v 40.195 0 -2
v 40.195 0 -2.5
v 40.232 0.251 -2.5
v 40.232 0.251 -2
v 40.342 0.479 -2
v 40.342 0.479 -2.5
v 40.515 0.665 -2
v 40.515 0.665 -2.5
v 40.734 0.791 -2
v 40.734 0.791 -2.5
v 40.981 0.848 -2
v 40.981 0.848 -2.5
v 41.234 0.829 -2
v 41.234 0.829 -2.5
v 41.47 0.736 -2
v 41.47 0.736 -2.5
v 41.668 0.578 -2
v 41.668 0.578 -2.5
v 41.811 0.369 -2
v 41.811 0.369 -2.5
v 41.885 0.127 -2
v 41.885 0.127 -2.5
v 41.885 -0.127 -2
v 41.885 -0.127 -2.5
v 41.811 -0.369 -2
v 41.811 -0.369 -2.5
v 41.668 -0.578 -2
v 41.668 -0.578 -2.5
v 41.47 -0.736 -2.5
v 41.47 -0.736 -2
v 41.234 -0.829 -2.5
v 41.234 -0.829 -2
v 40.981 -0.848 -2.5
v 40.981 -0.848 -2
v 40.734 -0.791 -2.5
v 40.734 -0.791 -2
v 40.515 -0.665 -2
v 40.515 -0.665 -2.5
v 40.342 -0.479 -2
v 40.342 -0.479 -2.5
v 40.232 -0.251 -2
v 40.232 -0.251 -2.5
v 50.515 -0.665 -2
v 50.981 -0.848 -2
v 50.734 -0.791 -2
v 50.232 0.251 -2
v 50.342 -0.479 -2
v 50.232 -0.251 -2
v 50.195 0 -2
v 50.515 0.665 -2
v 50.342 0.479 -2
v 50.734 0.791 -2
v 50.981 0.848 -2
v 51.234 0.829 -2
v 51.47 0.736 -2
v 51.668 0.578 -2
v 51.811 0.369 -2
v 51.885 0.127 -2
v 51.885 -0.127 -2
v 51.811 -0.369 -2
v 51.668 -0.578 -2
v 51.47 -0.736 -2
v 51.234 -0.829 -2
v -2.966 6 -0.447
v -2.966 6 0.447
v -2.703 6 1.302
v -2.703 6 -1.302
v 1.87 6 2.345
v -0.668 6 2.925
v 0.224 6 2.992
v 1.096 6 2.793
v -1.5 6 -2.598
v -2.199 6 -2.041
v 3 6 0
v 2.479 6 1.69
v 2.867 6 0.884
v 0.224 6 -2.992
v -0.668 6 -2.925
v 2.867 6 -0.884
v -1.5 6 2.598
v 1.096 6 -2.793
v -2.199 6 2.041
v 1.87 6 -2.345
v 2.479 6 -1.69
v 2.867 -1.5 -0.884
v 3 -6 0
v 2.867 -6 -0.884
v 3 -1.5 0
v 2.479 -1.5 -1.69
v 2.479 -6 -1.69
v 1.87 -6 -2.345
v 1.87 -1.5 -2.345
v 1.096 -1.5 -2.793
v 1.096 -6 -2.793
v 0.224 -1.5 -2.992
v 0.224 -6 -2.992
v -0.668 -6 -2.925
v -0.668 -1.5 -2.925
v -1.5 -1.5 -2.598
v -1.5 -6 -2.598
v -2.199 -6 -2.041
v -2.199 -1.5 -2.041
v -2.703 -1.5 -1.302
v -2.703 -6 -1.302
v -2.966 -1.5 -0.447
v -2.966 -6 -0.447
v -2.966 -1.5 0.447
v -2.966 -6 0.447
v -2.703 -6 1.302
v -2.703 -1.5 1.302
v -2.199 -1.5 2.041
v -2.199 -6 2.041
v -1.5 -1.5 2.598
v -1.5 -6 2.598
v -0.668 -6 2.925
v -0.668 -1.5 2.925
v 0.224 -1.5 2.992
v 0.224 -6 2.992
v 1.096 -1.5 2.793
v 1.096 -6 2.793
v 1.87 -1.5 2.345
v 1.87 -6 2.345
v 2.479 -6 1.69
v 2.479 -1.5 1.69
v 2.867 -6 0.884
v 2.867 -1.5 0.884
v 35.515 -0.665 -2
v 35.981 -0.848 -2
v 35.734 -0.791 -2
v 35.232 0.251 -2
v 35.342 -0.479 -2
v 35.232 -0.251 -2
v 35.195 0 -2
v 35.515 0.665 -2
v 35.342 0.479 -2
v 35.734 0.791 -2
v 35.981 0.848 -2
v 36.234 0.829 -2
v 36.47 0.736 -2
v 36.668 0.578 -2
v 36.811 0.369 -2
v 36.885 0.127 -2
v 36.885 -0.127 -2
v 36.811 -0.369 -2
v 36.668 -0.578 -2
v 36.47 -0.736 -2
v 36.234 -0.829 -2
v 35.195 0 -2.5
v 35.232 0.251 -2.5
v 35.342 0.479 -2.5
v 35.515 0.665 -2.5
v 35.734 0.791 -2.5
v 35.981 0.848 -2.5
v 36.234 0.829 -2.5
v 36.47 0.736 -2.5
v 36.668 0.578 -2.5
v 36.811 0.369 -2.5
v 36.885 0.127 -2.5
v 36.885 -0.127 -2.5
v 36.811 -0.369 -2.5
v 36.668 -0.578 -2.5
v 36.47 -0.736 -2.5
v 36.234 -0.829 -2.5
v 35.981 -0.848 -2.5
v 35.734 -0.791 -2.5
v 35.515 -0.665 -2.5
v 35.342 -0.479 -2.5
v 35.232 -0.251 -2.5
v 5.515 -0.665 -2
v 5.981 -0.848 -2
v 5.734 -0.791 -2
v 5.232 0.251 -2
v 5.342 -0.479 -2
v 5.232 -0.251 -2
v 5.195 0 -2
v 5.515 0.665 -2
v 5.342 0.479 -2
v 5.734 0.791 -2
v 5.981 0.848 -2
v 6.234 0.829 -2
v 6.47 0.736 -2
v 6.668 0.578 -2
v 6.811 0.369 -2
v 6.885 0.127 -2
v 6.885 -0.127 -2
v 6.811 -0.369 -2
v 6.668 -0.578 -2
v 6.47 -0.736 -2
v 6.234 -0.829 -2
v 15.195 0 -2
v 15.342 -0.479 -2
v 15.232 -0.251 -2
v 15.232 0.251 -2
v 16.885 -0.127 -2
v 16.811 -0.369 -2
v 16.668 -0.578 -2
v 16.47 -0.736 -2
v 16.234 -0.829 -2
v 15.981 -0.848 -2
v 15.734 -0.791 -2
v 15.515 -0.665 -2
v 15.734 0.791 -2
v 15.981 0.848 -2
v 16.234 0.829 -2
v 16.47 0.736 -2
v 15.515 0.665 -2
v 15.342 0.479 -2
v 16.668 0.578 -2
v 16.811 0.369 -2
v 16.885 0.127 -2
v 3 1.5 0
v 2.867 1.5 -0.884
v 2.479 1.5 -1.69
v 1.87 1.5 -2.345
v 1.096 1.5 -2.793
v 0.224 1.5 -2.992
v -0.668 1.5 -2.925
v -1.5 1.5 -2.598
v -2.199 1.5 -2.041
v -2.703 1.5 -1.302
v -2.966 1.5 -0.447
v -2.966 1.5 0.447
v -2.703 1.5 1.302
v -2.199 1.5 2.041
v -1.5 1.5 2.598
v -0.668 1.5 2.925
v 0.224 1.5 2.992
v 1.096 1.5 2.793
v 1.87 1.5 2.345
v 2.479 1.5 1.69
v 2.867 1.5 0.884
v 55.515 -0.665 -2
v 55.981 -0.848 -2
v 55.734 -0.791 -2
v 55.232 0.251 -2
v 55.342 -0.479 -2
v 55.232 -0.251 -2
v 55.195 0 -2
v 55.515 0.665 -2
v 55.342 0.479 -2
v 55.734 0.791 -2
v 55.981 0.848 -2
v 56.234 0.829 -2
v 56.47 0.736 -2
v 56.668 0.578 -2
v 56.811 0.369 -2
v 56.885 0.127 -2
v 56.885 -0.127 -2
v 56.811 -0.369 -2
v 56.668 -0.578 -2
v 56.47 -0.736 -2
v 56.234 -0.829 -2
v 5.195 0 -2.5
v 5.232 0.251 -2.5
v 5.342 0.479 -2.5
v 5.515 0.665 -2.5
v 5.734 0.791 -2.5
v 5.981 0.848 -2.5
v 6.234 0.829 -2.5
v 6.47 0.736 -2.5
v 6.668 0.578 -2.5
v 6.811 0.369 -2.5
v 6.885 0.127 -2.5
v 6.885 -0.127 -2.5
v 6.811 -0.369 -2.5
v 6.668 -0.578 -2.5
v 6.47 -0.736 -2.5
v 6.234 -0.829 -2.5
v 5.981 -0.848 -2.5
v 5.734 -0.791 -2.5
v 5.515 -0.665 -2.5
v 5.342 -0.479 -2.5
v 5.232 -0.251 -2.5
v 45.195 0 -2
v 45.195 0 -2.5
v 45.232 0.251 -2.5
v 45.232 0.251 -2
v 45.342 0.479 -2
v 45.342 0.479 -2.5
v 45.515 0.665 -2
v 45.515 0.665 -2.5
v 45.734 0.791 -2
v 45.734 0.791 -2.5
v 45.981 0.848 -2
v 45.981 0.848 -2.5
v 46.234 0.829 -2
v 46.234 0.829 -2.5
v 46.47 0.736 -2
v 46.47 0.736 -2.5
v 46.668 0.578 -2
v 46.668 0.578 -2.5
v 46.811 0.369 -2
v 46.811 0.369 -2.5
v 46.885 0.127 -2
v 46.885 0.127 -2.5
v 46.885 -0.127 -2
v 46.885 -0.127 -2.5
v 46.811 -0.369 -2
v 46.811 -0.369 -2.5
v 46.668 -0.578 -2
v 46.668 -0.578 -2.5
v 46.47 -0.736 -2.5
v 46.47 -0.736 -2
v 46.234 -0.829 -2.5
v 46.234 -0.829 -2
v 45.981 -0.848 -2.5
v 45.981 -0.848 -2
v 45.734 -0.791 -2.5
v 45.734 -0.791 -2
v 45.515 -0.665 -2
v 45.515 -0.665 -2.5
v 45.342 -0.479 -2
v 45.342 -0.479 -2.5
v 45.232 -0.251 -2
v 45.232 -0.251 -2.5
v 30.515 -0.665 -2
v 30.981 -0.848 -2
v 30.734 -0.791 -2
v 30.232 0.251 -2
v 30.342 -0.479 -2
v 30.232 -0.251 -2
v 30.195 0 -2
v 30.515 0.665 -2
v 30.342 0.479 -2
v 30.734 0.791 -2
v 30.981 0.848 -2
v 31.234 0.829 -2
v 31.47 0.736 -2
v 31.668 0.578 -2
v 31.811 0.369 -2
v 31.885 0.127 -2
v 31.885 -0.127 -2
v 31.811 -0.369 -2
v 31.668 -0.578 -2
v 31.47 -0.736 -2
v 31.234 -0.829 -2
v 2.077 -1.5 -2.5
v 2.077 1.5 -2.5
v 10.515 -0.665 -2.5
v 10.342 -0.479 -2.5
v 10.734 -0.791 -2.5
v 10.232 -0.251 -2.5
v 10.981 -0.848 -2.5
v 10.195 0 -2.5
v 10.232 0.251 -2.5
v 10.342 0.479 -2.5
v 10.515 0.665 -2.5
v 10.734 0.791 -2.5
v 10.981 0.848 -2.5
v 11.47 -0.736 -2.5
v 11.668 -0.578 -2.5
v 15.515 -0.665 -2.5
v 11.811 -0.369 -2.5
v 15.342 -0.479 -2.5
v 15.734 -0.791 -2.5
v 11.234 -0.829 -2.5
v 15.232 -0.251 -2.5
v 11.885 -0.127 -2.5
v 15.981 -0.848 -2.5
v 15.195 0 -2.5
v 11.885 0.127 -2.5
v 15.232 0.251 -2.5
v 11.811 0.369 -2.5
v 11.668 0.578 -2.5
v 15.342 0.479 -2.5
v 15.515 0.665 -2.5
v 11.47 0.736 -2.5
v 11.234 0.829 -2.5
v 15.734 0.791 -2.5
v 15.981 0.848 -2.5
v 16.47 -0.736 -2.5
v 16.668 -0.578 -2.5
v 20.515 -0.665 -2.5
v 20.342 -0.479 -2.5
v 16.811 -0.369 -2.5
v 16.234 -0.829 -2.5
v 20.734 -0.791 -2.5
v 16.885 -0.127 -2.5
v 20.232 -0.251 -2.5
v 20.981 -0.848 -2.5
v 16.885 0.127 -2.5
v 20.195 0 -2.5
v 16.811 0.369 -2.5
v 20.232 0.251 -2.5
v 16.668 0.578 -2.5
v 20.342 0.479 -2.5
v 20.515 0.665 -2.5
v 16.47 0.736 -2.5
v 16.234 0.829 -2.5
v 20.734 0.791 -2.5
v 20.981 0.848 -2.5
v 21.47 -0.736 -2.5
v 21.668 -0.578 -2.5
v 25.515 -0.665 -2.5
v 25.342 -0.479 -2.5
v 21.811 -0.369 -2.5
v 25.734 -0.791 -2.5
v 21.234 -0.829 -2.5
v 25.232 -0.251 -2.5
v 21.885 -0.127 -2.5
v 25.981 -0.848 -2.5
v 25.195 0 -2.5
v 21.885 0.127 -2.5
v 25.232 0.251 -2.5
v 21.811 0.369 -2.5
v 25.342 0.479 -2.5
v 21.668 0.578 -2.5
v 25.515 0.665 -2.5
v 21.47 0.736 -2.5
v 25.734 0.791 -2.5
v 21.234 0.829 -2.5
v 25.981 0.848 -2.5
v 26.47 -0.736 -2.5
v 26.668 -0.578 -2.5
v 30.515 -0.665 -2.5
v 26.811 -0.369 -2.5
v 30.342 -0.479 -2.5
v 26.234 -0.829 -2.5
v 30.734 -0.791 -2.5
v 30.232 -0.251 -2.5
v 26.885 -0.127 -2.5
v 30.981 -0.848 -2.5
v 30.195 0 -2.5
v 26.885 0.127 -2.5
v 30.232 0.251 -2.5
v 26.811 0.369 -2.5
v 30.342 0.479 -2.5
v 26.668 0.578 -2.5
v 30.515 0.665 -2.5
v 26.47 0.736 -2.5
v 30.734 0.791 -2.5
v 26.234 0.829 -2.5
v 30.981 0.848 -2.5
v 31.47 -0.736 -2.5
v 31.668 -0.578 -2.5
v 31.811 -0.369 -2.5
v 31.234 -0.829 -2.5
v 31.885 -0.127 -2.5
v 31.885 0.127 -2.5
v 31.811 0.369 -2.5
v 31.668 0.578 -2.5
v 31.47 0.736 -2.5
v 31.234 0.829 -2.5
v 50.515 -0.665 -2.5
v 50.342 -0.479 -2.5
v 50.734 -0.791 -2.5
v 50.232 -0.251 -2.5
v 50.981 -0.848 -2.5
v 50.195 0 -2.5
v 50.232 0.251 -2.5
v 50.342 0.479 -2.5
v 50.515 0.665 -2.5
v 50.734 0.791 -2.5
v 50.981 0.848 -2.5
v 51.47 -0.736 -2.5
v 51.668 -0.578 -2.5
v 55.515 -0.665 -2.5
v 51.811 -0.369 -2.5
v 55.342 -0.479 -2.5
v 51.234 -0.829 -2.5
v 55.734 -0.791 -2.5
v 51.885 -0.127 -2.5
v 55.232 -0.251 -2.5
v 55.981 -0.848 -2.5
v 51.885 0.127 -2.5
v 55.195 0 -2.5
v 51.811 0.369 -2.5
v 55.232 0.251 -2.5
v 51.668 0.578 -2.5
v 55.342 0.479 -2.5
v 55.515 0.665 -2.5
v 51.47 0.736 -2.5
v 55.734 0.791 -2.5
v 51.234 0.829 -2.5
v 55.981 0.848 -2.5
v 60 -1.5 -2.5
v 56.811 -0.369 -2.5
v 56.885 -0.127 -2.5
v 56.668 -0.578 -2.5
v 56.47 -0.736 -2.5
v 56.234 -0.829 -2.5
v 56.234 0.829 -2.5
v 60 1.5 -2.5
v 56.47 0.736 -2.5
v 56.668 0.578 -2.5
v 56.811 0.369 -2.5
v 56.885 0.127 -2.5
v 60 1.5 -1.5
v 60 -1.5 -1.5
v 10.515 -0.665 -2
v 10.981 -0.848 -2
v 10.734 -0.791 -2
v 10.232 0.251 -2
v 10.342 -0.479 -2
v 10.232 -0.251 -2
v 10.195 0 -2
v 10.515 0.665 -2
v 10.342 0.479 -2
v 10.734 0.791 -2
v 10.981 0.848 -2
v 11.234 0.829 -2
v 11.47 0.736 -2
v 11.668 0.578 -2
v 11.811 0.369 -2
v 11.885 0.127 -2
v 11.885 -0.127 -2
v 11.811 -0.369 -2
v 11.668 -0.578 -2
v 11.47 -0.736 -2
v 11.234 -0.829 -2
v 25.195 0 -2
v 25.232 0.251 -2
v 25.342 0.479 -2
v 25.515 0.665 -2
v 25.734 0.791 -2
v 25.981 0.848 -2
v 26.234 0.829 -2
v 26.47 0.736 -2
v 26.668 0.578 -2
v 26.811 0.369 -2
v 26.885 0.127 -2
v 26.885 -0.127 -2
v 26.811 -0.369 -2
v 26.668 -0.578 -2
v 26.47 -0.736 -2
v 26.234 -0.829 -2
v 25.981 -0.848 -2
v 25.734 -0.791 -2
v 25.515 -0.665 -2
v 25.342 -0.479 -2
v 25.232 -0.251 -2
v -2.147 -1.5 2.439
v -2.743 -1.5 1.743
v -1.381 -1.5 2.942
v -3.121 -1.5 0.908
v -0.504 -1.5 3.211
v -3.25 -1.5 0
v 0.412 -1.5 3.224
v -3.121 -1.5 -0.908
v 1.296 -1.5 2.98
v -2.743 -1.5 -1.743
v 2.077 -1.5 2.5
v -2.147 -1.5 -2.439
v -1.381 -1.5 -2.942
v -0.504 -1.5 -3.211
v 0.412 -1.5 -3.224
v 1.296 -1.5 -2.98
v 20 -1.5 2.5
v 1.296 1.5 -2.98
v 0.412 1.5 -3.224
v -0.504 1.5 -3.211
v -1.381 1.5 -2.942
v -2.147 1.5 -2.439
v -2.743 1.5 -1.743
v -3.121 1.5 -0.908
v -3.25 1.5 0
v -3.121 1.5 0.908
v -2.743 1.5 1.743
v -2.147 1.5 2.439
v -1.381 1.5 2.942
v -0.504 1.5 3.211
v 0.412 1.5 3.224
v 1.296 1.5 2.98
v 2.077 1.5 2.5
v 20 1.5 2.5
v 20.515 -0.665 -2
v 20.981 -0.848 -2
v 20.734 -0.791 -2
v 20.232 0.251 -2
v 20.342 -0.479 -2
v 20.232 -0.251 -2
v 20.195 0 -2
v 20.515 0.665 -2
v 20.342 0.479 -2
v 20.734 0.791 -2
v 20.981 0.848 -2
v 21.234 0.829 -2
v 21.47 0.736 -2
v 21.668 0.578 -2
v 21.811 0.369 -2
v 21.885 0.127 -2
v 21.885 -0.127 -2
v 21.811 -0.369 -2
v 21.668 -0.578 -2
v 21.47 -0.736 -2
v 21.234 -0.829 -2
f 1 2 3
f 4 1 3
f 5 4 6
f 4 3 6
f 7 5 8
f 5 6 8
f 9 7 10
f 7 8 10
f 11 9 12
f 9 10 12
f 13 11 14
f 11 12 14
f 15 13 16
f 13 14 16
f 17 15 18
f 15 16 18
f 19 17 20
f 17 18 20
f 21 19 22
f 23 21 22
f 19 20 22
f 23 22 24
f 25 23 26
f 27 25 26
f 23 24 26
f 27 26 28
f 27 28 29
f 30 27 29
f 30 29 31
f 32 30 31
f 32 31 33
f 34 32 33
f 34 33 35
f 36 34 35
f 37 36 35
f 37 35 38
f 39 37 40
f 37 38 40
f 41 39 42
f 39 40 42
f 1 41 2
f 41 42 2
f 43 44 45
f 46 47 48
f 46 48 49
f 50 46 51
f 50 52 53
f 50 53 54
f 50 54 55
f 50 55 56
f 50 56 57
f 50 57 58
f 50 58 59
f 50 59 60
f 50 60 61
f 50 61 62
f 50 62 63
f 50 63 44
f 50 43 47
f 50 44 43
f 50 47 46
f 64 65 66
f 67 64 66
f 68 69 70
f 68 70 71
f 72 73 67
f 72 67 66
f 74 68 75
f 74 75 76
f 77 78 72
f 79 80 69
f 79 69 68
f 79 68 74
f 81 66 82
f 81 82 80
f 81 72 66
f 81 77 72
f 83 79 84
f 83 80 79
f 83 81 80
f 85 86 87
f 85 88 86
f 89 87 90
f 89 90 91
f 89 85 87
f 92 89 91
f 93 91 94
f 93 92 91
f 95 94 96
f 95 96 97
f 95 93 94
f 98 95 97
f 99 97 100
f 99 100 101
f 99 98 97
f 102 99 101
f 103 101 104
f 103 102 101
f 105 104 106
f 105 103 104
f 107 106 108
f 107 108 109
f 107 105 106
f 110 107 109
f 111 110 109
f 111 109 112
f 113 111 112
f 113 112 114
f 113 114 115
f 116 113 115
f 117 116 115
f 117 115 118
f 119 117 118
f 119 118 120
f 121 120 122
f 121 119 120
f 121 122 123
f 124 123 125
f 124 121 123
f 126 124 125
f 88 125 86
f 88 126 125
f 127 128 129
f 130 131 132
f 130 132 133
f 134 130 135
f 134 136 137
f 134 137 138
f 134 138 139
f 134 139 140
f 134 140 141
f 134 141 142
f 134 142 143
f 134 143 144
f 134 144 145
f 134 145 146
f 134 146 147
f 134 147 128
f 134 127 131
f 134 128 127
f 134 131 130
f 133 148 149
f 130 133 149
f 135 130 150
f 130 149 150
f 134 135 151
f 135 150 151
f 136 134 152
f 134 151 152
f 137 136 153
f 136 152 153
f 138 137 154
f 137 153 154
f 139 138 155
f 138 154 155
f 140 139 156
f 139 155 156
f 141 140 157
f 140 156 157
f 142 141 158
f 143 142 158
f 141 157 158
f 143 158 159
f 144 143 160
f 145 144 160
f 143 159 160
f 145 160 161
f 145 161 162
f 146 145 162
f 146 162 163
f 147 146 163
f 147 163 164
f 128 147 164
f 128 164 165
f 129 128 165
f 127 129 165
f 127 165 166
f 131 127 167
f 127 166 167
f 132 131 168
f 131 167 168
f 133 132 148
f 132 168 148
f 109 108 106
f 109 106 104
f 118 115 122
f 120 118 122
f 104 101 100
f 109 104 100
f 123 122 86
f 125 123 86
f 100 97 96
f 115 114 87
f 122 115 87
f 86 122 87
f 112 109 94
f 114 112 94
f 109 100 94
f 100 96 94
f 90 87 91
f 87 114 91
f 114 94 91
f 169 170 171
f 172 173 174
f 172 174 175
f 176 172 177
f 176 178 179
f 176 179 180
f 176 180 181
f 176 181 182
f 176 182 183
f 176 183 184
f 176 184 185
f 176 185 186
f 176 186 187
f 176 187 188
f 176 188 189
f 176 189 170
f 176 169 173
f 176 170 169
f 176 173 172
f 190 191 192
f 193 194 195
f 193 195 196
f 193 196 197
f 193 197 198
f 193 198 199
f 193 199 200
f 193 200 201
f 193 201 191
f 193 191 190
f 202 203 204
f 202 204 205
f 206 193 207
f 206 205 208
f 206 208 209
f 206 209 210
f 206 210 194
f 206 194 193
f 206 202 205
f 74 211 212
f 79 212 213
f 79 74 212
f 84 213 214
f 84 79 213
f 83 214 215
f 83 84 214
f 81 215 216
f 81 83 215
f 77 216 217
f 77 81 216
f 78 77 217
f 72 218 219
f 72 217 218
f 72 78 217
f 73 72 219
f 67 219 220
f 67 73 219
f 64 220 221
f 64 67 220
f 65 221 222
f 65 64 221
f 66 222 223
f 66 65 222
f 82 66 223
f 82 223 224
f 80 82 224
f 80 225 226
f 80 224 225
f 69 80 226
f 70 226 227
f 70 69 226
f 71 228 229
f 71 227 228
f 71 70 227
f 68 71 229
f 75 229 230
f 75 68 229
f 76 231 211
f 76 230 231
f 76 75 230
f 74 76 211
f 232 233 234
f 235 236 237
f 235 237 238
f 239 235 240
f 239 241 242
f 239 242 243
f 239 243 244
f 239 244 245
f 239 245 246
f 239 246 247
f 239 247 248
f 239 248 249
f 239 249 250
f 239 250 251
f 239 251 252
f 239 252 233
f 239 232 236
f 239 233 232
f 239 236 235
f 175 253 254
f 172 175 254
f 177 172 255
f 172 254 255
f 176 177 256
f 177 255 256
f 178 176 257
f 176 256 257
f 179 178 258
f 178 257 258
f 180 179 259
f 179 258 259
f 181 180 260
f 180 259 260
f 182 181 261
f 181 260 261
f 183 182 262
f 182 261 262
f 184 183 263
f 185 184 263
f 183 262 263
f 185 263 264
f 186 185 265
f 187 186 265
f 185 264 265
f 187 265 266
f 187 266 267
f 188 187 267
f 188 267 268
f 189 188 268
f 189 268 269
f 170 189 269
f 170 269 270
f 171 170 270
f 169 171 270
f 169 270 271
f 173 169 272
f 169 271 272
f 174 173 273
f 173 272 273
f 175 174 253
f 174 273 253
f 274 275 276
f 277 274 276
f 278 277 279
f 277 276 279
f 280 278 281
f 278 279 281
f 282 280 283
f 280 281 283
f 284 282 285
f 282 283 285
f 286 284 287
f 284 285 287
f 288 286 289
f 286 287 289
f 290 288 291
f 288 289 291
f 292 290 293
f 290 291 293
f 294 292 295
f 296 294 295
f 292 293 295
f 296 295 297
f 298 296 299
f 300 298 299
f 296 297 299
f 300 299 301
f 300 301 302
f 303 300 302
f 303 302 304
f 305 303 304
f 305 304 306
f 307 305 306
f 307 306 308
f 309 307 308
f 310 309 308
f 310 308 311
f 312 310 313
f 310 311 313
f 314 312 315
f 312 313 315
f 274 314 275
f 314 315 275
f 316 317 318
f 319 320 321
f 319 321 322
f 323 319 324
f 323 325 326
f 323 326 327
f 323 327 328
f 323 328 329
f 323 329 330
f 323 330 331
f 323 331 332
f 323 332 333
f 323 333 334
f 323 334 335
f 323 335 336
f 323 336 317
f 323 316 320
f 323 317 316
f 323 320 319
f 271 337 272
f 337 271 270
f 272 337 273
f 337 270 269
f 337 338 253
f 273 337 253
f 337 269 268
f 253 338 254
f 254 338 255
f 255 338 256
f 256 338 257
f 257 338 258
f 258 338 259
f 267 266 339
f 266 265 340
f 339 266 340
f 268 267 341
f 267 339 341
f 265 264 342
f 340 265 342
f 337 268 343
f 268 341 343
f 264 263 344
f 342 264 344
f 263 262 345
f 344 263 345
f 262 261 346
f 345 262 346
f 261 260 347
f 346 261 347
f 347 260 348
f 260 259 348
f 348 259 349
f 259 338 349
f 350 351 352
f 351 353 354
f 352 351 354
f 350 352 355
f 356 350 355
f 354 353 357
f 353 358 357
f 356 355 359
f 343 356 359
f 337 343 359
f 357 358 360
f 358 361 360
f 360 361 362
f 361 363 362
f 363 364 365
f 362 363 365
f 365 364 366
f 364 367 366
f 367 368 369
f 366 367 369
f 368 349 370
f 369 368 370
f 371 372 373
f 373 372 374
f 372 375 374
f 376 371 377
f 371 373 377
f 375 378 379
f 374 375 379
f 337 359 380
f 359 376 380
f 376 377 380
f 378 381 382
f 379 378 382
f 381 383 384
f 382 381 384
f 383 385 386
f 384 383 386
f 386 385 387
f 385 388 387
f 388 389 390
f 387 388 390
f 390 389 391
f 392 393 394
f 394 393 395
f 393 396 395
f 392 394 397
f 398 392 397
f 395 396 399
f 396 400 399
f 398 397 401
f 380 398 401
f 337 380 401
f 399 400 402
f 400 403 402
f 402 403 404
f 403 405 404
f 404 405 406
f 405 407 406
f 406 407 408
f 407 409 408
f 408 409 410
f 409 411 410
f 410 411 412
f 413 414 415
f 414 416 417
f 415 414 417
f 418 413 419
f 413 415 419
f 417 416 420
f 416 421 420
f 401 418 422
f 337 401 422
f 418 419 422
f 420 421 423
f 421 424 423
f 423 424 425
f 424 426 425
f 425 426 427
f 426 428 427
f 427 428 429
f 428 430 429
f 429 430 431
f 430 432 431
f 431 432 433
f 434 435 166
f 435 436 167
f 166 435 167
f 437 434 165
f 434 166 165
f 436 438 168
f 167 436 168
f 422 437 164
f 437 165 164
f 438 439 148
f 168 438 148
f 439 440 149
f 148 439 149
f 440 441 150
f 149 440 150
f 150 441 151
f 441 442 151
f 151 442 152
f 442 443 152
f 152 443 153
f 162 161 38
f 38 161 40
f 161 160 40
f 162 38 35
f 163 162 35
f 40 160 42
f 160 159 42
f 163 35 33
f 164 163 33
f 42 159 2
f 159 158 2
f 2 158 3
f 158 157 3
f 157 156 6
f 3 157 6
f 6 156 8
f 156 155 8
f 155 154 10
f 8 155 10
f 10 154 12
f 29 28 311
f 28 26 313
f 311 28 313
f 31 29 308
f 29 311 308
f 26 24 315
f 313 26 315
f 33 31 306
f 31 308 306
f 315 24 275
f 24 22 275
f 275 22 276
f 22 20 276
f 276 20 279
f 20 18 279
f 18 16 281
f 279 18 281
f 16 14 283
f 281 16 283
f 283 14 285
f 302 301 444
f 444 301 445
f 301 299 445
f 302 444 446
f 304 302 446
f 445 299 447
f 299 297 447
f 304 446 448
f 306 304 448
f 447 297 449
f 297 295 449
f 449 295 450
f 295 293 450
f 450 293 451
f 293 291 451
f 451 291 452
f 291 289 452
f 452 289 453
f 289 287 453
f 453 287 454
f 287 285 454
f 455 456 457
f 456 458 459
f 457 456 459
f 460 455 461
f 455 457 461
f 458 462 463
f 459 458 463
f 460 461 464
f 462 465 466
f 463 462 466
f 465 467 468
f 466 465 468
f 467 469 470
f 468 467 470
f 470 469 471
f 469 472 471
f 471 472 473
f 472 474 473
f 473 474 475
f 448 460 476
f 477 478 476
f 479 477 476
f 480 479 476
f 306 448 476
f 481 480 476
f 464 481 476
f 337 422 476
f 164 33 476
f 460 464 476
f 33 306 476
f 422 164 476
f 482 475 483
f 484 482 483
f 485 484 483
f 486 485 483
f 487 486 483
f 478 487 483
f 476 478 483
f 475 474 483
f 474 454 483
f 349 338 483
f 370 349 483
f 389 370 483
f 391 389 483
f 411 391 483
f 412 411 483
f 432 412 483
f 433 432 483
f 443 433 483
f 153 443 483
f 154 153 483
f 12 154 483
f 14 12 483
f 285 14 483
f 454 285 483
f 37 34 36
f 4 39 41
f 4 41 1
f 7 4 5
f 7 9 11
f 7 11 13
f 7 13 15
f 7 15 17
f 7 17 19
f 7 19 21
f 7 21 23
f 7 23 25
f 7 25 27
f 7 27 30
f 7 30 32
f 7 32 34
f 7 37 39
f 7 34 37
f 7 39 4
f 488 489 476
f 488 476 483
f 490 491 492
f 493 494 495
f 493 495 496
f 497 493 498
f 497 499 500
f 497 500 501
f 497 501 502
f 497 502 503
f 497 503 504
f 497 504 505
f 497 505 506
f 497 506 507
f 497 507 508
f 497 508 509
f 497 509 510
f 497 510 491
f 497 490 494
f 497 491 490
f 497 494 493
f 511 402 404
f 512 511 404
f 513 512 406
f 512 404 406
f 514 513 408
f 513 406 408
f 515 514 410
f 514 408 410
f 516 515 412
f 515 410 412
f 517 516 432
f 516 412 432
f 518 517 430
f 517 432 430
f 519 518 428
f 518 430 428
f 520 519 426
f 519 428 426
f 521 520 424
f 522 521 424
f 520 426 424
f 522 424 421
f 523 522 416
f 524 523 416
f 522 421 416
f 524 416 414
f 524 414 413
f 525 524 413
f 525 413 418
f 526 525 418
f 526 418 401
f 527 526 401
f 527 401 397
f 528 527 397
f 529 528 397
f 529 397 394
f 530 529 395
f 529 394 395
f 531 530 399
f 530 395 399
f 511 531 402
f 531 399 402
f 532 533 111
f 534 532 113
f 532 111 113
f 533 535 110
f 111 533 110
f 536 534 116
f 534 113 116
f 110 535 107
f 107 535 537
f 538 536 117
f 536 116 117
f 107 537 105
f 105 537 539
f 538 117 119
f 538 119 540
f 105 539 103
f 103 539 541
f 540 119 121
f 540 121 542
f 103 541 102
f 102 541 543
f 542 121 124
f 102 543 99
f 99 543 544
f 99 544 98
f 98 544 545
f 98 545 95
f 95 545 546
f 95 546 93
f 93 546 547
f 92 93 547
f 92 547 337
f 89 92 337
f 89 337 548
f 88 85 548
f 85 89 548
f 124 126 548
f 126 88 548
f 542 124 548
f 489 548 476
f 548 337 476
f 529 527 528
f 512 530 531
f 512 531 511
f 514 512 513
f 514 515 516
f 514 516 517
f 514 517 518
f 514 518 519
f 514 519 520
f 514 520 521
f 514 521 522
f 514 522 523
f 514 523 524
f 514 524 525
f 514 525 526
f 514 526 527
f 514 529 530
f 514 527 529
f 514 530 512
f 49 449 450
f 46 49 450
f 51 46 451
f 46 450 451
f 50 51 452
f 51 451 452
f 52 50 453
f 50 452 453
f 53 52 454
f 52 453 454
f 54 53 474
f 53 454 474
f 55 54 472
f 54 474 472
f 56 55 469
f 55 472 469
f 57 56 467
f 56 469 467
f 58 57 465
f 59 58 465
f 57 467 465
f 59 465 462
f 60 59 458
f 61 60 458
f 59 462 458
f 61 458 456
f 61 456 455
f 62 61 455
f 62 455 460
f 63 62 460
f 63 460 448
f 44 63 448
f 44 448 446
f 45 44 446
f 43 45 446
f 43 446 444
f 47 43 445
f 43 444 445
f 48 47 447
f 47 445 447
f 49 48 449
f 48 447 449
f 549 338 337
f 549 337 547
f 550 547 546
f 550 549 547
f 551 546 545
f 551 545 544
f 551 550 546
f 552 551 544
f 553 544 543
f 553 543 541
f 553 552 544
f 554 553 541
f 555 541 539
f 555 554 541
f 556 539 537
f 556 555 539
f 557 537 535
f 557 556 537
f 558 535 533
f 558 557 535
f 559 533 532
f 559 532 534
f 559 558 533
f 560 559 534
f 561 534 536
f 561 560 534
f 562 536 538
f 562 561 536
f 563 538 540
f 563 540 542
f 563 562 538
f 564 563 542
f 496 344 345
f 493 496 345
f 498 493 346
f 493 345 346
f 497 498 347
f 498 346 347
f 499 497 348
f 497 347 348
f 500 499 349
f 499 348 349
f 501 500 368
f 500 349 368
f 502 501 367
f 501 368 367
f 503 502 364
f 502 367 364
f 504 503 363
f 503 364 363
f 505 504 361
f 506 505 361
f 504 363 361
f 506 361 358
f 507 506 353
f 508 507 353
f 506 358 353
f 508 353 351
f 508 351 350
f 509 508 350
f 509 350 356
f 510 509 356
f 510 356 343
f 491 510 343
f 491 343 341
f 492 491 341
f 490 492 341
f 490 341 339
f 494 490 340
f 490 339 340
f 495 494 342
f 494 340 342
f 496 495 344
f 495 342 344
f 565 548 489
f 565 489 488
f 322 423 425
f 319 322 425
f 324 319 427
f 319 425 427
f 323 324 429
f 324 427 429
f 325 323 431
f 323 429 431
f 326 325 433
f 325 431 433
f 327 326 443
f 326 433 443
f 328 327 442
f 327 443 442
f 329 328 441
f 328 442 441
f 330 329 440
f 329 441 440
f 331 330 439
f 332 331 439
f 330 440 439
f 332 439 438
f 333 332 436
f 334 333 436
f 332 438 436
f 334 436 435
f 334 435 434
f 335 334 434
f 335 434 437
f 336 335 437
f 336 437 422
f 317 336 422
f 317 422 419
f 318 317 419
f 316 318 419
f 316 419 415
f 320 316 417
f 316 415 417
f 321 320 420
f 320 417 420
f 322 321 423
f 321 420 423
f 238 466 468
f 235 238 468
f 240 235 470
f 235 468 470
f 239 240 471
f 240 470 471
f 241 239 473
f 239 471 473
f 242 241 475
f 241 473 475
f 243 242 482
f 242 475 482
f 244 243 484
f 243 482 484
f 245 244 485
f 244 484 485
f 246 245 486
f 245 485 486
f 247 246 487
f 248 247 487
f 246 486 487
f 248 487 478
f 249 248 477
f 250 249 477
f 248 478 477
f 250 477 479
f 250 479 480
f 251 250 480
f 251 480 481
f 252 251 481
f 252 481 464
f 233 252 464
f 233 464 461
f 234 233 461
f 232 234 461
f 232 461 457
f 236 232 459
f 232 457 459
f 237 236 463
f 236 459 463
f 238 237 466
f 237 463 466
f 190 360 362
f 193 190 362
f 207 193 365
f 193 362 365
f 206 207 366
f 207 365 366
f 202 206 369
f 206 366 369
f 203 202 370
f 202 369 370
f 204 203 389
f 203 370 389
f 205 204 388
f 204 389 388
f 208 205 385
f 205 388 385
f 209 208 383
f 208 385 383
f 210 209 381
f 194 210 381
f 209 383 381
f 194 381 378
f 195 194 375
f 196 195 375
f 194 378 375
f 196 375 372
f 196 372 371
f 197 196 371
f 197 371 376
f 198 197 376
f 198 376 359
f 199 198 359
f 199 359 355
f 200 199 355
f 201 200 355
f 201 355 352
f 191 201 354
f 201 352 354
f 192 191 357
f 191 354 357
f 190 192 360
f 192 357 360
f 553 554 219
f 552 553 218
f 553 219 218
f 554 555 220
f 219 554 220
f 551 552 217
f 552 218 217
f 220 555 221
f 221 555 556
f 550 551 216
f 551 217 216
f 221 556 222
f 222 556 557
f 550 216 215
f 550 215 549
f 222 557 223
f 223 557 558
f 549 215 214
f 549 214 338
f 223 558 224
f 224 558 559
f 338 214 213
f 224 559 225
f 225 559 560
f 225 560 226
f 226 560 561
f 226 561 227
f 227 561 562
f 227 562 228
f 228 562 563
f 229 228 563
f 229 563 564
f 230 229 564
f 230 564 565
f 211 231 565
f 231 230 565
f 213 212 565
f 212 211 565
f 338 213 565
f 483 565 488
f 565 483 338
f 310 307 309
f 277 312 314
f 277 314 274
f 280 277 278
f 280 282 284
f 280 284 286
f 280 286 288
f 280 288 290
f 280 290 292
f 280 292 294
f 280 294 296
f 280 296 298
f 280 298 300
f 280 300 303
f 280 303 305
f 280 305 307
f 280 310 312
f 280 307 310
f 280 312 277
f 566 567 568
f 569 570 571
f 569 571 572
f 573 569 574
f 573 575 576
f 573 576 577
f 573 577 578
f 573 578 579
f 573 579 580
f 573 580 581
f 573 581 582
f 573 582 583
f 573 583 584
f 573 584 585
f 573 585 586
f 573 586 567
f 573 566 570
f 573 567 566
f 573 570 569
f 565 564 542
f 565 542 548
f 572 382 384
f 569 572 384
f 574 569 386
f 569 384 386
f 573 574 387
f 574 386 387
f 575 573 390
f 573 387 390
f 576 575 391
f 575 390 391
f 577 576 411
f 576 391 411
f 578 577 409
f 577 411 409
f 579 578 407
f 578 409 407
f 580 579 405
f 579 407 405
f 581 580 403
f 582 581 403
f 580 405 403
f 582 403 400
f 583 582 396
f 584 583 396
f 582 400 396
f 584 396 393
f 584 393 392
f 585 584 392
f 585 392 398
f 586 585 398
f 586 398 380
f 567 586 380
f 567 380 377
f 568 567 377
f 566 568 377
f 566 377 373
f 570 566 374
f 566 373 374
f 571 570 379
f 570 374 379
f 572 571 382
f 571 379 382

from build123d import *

# Parameters (mm, degrees)
SKETCH1_R           = 3.25
BOSS_EXTRUDE1_DEPTH = 1.5
SKETCH2_R           = 3
BOSS_EXTRUDE2_DEPTH = 6
SKETCH3_W           = 60
SKETCH3_H           = 3
BOSS_EXTRUDE3_DEPTH = 2.5
CHAMFER1_SIZE       = 4
CHAMFER1_SIZE2      = 40
SKETCH4_R           = 0.85
CUT_EXTRUDE1_DEPTH  = 0.5


with BuildPart() as part:
    # Sketch1 → Boss-Extrude1 (new body, symmetric)
    with BuildSketch(Plane(origin=(0, 0, 0), x_dir=(1, 0, 0), z_dir=(0, 1, 0))):
        Circle(SKETCH1_R)
    extrude(amount=BOSS_EXTRUDE1_DEPTH, both=True)

    # Sketch2 → Boss-Extrude2 (add, symmetric)
    with BuildSketch(Plane(origin=(0, 0, 0), x_dir=(1, 0, 0), z_dir=(0, 1, 0))):
        Circle(SKETCH2_R)
    extrude(amount=BOSS_EXTRUDE2_DEPTH, both=True)

    # Sketch3 → Boss-Extrude3 (add, symmetric)
    with BuildSketch(Plane.XY):
        with Locations((30, 0)):
            Rectangle(SKETCH3_W, SKETCH3_H)
    extrude(amount=BOSS_EXTRUDE3_DEPTH, both=True)

    # Chamfer1
    chamfer1_edges = [part.edges().sort_by_distance(p)[0] for p in [
        (60, 0, 2.5),
    ]]
    chamfer1_side = [part.faces().sort_by_distance(p)[0] for p in [
        (60, 0, 0),
    ]]
    chamfer(chamfer1_edges, length=CHAMFER1_SIZE, length2=CHAMFER1_SIZE2, reference=chamfer1_side[0])

    # Sketch4 → Cut-Extrude1 (cut)
    with BuildSketch(Plane(origin=(0, 0, -2.5), x_dir=(-1, 0, 0), z_dir=(0, 0, -1))):
        with Locations((-6.044728096, 0)):
            Circle(SKETCH4_R)
        with Locations((-11.044728096, 0)):
            Circle(SKETCH4_R)
        with Locations((-16.044728096, 0)):
            Circle(SKETCH4_R)
        with Locations((-21.044728096, 0)):
            Circle(SKETCH4_R)
        with Locations((-26.044728096, 0)):
            Circle(SKETCH4_R)
        with Locations((-31.044728096, 0)):
            Circle(SKETCH4_R)
        with Locations((-36.044728096, 0)):
            Circle(SKETCH4_R)
        with Locations((-41.044728096, 0)):
            Circle(SKETCH4_R)
        with Locations((-46.044728096, 0)):
            Circle(SKETCH4_R)
        with Locations((-51.044728096, 0)):
            Circle(SKETCH4_R)
        with Locations((-56.044728096, 0)):
            Circle(SKETCH4_R)
    extrude(amount=-CUT_EXTRUDE1_DEPTH, mode=Mode.SUBTRACT)


solid = part.part
